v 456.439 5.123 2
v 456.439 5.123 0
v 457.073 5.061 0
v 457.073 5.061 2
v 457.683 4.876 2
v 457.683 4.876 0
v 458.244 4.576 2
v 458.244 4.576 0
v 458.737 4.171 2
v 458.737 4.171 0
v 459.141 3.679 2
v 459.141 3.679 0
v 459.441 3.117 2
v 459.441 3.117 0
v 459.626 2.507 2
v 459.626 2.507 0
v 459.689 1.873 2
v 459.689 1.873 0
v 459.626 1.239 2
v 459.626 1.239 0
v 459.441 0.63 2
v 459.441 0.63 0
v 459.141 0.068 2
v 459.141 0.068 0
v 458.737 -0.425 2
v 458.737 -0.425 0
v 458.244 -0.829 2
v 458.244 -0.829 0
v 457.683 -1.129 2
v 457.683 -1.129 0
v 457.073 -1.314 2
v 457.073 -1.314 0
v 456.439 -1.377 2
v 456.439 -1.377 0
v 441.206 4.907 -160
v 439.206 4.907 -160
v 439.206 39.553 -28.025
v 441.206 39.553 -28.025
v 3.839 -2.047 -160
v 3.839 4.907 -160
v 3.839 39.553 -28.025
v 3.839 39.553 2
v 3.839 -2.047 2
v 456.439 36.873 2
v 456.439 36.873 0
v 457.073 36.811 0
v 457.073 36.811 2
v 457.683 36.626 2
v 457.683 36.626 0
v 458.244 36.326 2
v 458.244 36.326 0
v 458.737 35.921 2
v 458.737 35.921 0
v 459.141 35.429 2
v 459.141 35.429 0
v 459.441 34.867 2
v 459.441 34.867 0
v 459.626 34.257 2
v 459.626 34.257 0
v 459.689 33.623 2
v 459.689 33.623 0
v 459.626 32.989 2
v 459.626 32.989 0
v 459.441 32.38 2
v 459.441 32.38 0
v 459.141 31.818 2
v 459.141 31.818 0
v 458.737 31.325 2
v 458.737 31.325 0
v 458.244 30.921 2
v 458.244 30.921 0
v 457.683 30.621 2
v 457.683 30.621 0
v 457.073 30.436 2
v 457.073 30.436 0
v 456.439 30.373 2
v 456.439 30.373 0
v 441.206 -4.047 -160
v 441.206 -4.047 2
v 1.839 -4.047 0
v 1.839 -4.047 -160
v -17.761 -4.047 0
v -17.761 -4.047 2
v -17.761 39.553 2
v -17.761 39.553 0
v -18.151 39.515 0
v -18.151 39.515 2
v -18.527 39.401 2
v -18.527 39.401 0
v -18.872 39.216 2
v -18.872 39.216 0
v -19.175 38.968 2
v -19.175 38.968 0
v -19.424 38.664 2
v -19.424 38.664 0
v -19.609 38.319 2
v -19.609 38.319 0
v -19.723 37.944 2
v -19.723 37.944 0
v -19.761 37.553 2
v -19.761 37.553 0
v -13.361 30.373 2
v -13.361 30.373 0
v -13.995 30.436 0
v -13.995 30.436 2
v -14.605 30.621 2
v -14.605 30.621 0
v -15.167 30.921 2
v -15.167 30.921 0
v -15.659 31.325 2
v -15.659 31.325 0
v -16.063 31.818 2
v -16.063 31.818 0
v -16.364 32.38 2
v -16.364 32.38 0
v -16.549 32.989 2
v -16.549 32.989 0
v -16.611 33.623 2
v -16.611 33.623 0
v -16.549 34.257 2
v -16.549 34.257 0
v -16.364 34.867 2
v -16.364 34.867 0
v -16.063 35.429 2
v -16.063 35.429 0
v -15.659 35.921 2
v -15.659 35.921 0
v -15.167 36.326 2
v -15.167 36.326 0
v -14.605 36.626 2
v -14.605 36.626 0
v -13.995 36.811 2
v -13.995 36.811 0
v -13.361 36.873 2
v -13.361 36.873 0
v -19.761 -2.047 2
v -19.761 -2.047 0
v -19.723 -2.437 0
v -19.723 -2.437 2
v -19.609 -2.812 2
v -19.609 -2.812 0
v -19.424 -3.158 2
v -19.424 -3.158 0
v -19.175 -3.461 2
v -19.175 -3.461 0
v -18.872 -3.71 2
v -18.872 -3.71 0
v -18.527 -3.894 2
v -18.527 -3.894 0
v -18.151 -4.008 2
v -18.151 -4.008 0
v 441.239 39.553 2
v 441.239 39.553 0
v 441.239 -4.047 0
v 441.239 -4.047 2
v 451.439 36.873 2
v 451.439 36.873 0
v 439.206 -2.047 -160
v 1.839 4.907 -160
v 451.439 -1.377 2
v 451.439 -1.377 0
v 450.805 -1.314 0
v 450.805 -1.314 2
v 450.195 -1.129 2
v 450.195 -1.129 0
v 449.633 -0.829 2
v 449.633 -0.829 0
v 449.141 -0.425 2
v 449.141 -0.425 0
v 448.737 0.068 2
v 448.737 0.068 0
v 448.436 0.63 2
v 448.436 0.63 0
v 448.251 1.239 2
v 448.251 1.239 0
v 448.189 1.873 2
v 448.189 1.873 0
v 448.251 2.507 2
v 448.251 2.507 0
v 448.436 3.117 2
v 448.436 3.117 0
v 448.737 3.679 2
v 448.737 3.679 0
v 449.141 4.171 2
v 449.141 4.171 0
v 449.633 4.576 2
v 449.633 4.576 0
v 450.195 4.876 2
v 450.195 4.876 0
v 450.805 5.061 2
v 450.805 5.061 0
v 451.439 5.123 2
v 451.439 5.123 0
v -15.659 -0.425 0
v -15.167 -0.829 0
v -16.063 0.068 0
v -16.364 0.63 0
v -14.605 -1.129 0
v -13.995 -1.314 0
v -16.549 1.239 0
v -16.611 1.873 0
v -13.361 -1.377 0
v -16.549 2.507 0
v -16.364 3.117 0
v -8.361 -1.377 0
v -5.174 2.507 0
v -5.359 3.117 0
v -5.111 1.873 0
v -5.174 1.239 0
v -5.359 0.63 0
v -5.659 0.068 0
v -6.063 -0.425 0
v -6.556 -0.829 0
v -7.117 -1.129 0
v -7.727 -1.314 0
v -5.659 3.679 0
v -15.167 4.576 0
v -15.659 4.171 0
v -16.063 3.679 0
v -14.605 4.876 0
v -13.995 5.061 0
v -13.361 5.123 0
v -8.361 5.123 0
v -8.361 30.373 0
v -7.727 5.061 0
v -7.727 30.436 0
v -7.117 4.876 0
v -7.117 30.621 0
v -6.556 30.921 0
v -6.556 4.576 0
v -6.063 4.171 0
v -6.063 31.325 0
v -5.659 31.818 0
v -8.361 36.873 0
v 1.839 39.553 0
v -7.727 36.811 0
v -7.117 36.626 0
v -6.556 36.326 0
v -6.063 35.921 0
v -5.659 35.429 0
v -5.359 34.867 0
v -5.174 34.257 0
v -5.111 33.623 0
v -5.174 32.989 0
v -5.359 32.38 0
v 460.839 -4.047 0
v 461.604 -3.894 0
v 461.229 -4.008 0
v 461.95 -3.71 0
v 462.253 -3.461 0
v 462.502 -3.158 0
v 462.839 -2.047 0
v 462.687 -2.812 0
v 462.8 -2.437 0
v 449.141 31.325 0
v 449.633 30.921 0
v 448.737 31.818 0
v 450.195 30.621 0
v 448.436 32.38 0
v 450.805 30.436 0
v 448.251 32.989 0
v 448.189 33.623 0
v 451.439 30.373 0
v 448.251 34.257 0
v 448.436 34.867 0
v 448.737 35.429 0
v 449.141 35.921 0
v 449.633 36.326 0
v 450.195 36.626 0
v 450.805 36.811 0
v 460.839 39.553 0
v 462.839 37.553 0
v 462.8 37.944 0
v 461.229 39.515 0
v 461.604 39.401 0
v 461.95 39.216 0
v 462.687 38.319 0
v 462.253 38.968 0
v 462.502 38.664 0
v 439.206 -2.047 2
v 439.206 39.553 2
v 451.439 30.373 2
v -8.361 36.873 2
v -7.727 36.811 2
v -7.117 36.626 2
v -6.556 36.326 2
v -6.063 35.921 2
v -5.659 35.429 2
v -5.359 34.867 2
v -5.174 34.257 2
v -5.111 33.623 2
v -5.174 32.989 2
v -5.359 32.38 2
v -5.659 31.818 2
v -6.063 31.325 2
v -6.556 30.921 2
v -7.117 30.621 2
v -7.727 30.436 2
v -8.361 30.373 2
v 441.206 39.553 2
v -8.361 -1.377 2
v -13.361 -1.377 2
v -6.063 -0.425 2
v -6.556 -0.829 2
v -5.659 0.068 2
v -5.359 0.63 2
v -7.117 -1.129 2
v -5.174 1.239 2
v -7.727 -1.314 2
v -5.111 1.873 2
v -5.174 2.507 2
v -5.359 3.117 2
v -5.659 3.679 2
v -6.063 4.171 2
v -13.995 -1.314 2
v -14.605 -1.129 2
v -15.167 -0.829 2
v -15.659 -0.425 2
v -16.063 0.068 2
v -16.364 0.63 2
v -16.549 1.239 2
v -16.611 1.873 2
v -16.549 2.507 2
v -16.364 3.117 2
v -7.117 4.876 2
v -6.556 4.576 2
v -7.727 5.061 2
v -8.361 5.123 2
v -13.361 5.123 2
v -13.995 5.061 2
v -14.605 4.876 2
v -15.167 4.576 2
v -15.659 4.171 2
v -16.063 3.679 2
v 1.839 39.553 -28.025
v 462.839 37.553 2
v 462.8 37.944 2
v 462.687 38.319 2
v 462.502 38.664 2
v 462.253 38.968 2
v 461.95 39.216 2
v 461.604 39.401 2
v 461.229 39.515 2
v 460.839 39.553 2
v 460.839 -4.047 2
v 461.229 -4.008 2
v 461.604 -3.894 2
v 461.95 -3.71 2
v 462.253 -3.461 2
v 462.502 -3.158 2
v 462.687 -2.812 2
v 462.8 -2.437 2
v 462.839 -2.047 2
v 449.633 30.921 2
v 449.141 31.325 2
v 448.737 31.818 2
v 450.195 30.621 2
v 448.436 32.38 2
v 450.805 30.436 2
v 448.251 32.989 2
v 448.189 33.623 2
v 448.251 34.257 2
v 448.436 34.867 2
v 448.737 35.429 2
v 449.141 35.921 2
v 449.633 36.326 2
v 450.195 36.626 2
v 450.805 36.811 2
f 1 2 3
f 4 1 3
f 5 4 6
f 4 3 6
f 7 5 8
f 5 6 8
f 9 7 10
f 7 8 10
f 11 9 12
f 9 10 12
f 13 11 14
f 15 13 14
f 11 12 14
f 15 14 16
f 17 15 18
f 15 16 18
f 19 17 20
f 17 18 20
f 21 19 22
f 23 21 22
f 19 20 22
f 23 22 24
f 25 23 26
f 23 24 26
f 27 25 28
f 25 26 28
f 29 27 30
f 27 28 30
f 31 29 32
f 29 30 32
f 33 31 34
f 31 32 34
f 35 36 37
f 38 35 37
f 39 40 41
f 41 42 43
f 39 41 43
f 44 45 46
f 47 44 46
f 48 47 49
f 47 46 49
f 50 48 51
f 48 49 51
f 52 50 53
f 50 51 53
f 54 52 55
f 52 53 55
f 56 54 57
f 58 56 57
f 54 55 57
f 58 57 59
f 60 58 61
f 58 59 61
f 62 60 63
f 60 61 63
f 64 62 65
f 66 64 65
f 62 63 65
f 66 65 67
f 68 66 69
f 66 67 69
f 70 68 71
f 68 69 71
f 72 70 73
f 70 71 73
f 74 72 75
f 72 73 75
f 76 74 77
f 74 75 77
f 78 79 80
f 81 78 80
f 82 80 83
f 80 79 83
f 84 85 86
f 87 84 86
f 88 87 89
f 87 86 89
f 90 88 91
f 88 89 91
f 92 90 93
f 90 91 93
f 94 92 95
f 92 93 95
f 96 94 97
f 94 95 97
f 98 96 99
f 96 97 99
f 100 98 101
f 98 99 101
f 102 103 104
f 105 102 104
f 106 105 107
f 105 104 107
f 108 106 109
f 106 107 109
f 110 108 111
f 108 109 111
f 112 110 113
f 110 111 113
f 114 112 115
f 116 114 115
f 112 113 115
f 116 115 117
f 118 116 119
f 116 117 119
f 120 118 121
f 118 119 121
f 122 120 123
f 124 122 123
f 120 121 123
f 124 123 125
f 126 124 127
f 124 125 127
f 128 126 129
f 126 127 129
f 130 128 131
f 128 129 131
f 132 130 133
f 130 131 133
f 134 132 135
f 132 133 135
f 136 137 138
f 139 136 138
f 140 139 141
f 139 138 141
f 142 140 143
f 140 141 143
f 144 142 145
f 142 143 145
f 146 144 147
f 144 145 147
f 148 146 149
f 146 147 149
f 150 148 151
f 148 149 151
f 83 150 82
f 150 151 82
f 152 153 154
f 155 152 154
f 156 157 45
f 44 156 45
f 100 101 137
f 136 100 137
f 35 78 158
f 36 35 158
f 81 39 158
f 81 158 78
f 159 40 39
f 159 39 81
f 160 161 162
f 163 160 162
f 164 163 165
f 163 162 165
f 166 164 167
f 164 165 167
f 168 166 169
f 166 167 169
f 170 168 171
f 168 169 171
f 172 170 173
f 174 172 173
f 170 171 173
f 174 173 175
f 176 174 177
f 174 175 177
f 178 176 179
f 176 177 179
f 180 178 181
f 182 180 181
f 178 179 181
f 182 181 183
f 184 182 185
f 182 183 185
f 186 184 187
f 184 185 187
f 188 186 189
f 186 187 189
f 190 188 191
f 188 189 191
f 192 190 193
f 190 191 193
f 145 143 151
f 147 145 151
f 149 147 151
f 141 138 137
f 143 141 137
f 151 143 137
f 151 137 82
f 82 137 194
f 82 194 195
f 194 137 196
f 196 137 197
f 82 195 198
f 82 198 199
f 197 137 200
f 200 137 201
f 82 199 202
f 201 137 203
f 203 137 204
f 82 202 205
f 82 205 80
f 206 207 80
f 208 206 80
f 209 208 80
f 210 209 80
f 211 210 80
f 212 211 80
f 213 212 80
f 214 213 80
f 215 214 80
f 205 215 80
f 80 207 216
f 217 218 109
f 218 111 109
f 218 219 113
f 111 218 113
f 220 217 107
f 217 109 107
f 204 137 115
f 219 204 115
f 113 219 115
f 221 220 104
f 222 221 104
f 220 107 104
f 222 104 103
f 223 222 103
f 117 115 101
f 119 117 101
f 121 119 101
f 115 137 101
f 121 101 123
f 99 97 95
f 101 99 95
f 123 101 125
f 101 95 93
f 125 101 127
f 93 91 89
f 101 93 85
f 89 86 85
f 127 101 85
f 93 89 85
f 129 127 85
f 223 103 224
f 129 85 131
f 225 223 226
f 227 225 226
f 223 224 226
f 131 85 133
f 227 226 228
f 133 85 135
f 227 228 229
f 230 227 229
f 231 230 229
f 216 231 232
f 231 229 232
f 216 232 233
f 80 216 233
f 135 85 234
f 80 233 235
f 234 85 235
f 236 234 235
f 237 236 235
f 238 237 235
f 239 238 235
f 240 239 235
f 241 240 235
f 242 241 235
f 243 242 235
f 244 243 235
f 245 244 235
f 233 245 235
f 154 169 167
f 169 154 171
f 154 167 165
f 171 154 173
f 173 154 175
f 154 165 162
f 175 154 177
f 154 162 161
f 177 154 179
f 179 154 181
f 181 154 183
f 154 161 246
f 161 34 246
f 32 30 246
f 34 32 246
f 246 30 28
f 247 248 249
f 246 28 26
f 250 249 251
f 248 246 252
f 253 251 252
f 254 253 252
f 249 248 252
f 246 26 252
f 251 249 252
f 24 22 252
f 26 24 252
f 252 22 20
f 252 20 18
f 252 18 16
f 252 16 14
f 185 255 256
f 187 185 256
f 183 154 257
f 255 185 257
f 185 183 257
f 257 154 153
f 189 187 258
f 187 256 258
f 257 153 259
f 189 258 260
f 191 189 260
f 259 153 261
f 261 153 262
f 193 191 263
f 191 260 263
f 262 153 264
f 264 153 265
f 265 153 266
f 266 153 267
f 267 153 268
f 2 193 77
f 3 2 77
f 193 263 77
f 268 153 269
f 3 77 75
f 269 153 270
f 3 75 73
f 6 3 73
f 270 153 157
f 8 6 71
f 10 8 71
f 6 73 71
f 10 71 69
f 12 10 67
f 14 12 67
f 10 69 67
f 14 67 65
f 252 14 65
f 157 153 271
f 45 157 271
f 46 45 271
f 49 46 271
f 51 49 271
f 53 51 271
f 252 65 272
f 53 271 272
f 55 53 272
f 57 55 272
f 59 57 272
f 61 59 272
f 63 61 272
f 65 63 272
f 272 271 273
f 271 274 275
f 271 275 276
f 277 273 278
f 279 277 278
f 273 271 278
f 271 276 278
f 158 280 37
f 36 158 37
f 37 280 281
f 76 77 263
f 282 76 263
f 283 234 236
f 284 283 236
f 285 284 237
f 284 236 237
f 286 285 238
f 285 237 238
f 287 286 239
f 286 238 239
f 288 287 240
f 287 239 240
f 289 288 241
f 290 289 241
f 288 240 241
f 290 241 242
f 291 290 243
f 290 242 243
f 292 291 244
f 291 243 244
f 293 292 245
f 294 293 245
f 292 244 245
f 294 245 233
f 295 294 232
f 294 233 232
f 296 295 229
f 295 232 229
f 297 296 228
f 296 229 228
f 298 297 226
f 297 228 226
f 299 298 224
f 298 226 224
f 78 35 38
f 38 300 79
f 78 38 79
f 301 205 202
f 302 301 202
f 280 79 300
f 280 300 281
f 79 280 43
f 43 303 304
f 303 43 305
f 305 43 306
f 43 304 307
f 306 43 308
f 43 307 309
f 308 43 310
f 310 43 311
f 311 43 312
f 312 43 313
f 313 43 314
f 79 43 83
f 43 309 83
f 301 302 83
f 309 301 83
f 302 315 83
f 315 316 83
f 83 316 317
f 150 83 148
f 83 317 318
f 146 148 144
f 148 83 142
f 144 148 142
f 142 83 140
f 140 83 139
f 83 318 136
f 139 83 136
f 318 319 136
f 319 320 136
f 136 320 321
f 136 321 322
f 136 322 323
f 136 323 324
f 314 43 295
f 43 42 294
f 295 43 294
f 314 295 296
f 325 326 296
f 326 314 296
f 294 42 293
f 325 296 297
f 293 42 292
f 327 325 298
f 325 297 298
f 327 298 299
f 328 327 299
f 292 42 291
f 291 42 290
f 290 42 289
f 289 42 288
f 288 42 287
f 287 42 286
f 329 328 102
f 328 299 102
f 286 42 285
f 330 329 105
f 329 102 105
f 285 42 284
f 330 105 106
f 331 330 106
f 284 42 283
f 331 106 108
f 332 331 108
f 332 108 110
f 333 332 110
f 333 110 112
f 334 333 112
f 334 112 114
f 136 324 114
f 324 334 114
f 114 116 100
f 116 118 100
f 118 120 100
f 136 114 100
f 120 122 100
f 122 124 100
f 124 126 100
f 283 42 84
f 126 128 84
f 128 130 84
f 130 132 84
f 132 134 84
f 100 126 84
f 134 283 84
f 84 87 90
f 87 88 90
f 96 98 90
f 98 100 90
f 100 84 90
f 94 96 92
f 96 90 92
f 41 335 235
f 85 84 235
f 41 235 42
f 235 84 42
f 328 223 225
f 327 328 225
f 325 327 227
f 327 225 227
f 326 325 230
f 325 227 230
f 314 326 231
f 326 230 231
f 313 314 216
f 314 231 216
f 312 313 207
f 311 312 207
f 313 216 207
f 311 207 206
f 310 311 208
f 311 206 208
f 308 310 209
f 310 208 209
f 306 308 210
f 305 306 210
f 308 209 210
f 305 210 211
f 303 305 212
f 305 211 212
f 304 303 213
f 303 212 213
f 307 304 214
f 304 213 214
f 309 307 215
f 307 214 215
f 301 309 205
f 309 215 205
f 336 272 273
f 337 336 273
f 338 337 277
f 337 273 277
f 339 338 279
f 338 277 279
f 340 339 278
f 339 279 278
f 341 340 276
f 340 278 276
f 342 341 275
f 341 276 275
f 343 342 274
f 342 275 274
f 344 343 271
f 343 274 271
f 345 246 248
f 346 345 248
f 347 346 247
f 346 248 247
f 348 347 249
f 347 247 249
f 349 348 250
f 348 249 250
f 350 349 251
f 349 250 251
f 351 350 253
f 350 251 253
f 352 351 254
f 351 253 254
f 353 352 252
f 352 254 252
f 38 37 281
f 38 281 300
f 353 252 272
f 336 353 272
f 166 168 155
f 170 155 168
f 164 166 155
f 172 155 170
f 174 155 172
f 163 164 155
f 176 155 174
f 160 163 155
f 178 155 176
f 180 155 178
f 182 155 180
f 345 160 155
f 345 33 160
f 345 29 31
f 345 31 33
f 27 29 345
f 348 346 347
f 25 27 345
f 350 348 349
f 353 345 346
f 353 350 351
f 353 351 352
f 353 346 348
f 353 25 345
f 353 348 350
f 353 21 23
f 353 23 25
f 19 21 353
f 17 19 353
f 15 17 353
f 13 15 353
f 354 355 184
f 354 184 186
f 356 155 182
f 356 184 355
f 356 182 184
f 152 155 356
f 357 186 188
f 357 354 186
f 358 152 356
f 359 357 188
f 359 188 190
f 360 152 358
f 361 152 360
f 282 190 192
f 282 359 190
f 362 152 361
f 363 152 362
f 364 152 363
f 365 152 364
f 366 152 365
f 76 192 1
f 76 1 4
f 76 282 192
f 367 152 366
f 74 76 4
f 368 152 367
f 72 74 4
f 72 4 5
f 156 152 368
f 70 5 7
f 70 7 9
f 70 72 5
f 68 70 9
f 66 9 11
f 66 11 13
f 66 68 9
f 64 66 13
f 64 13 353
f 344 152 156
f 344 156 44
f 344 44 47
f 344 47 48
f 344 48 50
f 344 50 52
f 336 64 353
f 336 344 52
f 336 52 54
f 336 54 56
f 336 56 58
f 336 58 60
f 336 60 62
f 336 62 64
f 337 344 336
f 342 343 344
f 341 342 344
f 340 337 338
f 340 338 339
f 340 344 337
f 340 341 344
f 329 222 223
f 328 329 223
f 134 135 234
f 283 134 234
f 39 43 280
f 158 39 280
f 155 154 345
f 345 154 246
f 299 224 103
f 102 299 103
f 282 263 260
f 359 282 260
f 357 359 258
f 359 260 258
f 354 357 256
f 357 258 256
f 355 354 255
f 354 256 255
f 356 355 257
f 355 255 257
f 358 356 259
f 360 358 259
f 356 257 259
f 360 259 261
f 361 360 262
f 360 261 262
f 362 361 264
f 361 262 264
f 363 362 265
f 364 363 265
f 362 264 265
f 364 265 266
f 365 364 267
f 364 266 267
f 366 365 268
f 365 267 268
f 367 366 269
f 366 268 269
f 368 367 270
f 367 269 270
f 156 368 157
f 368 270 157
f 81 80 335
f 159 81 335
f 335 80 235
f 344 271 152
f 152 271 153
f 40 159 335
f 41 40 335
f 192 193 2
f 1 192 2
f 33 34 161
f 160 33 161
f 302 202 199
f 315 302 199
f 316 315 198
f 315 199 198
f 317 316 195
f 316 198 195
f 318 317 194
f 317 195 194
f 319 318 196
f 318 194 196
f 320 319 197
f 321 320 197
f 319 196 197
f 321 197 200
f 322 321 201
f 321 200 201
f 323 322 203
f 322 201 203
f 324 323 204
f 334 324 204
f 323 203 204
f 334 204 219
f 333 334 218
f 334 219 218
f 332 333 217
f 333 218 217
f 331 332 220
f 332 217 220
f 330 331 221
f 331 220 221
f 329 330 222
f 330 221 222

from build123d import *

# Parameters (mm, degrees)
BOSS_EXTRUDE1_DEPTH     = 2
BOSS_EXTRUDE1_2_DEPTH   = 2
CUT_EXTRUDE4_DEPTH      = 465.530162852
CUT_EXTRUDE4_DEPTH_BACK = 2
BOSS_EXTRUDE2_DEPTH     = 162
CUT_EXTRUDE5_DEPTH      = 517


with BuildPart() as part:
    # Sketch2 → Boss-Extrude1 (new body)
    with BuildSketch(Plane.XY):
        with BuildLine():
            Line((-19.761146461, 37.553354522), (-19.761146461, -2.046645478))
            ThreePointArc((-19.761146461, -2.046645478), (-19.175360023, -3.46085904), (-17.761146461, -4.046645478))
            Line((-17.761146461, -4.046645478), (1.838853539, -4.046645478))
            Line((1.838853539, -4.046645478), (1.838853539, -2.446645478))
            Line((1.838853539, -2.446645478), (1.838853539, 37.953354522))
            Line((1.838853539, 37.953354522), (1.838853539, 39.553354522))
            Line((1.838853539, 39.553354522), (-17.761146461, 39.553354522))
            ThreePointArc((-17.761146461, 39.553354522), (-19.175360023, 38.967568085), (-19.761146461, 37.553354522))
        make_face()
    extrude(amount=BOSS_EXTRUDE1_DEPTH)


with BuildPart() as body_2:
    # Sketch2 → Boss-Extrude1 2 (new body)
    with BuildSketch(Plane.XY):
        with BuildLine():
            Line((441.238853539, -2.446645478), (441.238853539, -4.046645478))
            Line((441.238853539, -4.046645478), (460.838853539, -4.046645478))
            ThreePointArc((460.838853539, -4.046645478), (462.253067101, -3.46085904), (462.838853539, -2.046645478))
            Line((462.838853539, -2.046645478), (462.838853539, 37.553354522))
            ThreePointArc((462.838853539, 37.553354522), (462.253067101, 38.967568085), (460.838853539, 39.553354522))
            Line((460.838853539, 39.553354522), (441.238853539, 39.553354522))
            Line((441.238853539, 39.553354522), (441.238853539, 37.953354522))
            Line((441.238853539, 37.953354522), (441.238853539, -2.446645478))
        make_face()
    extrude(amount=BOSS_EXTRUDE1_2_DEPTH)


with BuildPart() as cut_extrude4_tool:
    # Sketch3 → Cut-Extrude4 (new, two sides: drawn at the far end of the back side and taken through both)
    with BuildSketch(Plane.XY.offset(-CUT_EXTRUDE4_DEPTH_BACK)):
        with BuildLine():
            Line((-8.361146461, -1.376645478), (-13.361146461, -1.376645478))
            ThreePointArc((-13.361146461, -1.376645478), (-16.611146461, 1.873354522), (-13.361146461, 5.123354522))
            Line((-13.361146461, 5.123354522), (-8.361146461, 5.123354522))
            ThreePointArc((-8.361146461, 5.123354522), (-5.111146461, 1.873354522), (-8.361146461, -1.376645478))
        make_face()
        with BuildLine():
            Line((-8.361146461, 30.373354522), (-13.361146461, 30.373354522))
            ThreePointArc((-13.361146461, 30.373354522), (-16.611146461, 33.623354522), (-13.361146461, 36.873354522))
            Line((-13.361146461, 36.873354522), (-8.361146461, 36.873354522))
            ThreePointArc((-8.361146461, 36.873354522), (-5.111146461, 33.623354522), (-8.361146461, 30.373354522))
        make_face()
        with BuildLine():
            Line((456.438853539, -1.376645478), (451.438853539, -1.376645478))
            ThreePointArc((451.438853539, -1.376645478), (448.188853539, 1.873354522), (451.438853539, 5.123354522))
            Line((451.438853539, 5.123354522), (456.438853539, 5.123354522))
            ThreePointArc((456.438853539, 5.123354522), (459.688853539, 1.873354522), (456.438853539, -1.376645478))
        make_face()
        with BuildLine():
            Line((456.438853539, 30.373354522), (451.438853539, 30.373354522))
            ThreePointArc((451.438853539, 30.373354522), (448.188853539, 33.623354522), (451.438853539, 36.873354522))
            Line((451.438853539, 36.873354522), (456.438853539, 36.873354522))
            ThreePointArc((456.438853539, 36.873354522), (459.688853539, 33.623354522), (456.438853539, 30.373354522))
        make_face()
    extrude(amount=CUT_EXTRUDE4_DEPTH + CUT_EXTRUDE4_DEPTH_BACK)


with BuildPart() as part_1:
    add(part.part)

    # Cut-Extrude4: cut by cut_extrude4_tool
    add(cut_extrude4_tool.part, mode=Mode.SUBTRACT)

    # Sketch4 → Boss-Extrude2 (add)
    with BuildSketch(Plane.XY.offset(2)):
        Polygon((439.205636074, 39.553354522), (441.205636074, 39.553354522), (441.205636074, -4.046645478), (1.838853539, -4.046645478), (1.838853539, 39.553354522), (3.838853539, 39.553354522), (3.838853539, -2.046645478), (439.205636074, -2.046645478), align=None)
    extrude(amount=-BOSS_EXTRUDE2_DEPTH)

    # Sketch5 → Cut-Extrude5 (cut)
    with BuildSketch(Plane.ZY.offset(-1.838853539)):
        Polygon((-160, 4.907474546), (-28.02547798, 39.553354522), (-160, 39.553354522), align=None)
    extrude(amount=-CUT_EXTRUDE5_DEPTH, mode=Mode.SUBTRACT)


with BuildPart() as body_2_1:
    add(body_2.part)

    # Cut-Extrude4: cut by cut_extrude4_tool
    add(cut_extrude4_tool.part, mode=Mode.SUBTRACT)


solid = Compound([part_1.part, body_2_1.part])
